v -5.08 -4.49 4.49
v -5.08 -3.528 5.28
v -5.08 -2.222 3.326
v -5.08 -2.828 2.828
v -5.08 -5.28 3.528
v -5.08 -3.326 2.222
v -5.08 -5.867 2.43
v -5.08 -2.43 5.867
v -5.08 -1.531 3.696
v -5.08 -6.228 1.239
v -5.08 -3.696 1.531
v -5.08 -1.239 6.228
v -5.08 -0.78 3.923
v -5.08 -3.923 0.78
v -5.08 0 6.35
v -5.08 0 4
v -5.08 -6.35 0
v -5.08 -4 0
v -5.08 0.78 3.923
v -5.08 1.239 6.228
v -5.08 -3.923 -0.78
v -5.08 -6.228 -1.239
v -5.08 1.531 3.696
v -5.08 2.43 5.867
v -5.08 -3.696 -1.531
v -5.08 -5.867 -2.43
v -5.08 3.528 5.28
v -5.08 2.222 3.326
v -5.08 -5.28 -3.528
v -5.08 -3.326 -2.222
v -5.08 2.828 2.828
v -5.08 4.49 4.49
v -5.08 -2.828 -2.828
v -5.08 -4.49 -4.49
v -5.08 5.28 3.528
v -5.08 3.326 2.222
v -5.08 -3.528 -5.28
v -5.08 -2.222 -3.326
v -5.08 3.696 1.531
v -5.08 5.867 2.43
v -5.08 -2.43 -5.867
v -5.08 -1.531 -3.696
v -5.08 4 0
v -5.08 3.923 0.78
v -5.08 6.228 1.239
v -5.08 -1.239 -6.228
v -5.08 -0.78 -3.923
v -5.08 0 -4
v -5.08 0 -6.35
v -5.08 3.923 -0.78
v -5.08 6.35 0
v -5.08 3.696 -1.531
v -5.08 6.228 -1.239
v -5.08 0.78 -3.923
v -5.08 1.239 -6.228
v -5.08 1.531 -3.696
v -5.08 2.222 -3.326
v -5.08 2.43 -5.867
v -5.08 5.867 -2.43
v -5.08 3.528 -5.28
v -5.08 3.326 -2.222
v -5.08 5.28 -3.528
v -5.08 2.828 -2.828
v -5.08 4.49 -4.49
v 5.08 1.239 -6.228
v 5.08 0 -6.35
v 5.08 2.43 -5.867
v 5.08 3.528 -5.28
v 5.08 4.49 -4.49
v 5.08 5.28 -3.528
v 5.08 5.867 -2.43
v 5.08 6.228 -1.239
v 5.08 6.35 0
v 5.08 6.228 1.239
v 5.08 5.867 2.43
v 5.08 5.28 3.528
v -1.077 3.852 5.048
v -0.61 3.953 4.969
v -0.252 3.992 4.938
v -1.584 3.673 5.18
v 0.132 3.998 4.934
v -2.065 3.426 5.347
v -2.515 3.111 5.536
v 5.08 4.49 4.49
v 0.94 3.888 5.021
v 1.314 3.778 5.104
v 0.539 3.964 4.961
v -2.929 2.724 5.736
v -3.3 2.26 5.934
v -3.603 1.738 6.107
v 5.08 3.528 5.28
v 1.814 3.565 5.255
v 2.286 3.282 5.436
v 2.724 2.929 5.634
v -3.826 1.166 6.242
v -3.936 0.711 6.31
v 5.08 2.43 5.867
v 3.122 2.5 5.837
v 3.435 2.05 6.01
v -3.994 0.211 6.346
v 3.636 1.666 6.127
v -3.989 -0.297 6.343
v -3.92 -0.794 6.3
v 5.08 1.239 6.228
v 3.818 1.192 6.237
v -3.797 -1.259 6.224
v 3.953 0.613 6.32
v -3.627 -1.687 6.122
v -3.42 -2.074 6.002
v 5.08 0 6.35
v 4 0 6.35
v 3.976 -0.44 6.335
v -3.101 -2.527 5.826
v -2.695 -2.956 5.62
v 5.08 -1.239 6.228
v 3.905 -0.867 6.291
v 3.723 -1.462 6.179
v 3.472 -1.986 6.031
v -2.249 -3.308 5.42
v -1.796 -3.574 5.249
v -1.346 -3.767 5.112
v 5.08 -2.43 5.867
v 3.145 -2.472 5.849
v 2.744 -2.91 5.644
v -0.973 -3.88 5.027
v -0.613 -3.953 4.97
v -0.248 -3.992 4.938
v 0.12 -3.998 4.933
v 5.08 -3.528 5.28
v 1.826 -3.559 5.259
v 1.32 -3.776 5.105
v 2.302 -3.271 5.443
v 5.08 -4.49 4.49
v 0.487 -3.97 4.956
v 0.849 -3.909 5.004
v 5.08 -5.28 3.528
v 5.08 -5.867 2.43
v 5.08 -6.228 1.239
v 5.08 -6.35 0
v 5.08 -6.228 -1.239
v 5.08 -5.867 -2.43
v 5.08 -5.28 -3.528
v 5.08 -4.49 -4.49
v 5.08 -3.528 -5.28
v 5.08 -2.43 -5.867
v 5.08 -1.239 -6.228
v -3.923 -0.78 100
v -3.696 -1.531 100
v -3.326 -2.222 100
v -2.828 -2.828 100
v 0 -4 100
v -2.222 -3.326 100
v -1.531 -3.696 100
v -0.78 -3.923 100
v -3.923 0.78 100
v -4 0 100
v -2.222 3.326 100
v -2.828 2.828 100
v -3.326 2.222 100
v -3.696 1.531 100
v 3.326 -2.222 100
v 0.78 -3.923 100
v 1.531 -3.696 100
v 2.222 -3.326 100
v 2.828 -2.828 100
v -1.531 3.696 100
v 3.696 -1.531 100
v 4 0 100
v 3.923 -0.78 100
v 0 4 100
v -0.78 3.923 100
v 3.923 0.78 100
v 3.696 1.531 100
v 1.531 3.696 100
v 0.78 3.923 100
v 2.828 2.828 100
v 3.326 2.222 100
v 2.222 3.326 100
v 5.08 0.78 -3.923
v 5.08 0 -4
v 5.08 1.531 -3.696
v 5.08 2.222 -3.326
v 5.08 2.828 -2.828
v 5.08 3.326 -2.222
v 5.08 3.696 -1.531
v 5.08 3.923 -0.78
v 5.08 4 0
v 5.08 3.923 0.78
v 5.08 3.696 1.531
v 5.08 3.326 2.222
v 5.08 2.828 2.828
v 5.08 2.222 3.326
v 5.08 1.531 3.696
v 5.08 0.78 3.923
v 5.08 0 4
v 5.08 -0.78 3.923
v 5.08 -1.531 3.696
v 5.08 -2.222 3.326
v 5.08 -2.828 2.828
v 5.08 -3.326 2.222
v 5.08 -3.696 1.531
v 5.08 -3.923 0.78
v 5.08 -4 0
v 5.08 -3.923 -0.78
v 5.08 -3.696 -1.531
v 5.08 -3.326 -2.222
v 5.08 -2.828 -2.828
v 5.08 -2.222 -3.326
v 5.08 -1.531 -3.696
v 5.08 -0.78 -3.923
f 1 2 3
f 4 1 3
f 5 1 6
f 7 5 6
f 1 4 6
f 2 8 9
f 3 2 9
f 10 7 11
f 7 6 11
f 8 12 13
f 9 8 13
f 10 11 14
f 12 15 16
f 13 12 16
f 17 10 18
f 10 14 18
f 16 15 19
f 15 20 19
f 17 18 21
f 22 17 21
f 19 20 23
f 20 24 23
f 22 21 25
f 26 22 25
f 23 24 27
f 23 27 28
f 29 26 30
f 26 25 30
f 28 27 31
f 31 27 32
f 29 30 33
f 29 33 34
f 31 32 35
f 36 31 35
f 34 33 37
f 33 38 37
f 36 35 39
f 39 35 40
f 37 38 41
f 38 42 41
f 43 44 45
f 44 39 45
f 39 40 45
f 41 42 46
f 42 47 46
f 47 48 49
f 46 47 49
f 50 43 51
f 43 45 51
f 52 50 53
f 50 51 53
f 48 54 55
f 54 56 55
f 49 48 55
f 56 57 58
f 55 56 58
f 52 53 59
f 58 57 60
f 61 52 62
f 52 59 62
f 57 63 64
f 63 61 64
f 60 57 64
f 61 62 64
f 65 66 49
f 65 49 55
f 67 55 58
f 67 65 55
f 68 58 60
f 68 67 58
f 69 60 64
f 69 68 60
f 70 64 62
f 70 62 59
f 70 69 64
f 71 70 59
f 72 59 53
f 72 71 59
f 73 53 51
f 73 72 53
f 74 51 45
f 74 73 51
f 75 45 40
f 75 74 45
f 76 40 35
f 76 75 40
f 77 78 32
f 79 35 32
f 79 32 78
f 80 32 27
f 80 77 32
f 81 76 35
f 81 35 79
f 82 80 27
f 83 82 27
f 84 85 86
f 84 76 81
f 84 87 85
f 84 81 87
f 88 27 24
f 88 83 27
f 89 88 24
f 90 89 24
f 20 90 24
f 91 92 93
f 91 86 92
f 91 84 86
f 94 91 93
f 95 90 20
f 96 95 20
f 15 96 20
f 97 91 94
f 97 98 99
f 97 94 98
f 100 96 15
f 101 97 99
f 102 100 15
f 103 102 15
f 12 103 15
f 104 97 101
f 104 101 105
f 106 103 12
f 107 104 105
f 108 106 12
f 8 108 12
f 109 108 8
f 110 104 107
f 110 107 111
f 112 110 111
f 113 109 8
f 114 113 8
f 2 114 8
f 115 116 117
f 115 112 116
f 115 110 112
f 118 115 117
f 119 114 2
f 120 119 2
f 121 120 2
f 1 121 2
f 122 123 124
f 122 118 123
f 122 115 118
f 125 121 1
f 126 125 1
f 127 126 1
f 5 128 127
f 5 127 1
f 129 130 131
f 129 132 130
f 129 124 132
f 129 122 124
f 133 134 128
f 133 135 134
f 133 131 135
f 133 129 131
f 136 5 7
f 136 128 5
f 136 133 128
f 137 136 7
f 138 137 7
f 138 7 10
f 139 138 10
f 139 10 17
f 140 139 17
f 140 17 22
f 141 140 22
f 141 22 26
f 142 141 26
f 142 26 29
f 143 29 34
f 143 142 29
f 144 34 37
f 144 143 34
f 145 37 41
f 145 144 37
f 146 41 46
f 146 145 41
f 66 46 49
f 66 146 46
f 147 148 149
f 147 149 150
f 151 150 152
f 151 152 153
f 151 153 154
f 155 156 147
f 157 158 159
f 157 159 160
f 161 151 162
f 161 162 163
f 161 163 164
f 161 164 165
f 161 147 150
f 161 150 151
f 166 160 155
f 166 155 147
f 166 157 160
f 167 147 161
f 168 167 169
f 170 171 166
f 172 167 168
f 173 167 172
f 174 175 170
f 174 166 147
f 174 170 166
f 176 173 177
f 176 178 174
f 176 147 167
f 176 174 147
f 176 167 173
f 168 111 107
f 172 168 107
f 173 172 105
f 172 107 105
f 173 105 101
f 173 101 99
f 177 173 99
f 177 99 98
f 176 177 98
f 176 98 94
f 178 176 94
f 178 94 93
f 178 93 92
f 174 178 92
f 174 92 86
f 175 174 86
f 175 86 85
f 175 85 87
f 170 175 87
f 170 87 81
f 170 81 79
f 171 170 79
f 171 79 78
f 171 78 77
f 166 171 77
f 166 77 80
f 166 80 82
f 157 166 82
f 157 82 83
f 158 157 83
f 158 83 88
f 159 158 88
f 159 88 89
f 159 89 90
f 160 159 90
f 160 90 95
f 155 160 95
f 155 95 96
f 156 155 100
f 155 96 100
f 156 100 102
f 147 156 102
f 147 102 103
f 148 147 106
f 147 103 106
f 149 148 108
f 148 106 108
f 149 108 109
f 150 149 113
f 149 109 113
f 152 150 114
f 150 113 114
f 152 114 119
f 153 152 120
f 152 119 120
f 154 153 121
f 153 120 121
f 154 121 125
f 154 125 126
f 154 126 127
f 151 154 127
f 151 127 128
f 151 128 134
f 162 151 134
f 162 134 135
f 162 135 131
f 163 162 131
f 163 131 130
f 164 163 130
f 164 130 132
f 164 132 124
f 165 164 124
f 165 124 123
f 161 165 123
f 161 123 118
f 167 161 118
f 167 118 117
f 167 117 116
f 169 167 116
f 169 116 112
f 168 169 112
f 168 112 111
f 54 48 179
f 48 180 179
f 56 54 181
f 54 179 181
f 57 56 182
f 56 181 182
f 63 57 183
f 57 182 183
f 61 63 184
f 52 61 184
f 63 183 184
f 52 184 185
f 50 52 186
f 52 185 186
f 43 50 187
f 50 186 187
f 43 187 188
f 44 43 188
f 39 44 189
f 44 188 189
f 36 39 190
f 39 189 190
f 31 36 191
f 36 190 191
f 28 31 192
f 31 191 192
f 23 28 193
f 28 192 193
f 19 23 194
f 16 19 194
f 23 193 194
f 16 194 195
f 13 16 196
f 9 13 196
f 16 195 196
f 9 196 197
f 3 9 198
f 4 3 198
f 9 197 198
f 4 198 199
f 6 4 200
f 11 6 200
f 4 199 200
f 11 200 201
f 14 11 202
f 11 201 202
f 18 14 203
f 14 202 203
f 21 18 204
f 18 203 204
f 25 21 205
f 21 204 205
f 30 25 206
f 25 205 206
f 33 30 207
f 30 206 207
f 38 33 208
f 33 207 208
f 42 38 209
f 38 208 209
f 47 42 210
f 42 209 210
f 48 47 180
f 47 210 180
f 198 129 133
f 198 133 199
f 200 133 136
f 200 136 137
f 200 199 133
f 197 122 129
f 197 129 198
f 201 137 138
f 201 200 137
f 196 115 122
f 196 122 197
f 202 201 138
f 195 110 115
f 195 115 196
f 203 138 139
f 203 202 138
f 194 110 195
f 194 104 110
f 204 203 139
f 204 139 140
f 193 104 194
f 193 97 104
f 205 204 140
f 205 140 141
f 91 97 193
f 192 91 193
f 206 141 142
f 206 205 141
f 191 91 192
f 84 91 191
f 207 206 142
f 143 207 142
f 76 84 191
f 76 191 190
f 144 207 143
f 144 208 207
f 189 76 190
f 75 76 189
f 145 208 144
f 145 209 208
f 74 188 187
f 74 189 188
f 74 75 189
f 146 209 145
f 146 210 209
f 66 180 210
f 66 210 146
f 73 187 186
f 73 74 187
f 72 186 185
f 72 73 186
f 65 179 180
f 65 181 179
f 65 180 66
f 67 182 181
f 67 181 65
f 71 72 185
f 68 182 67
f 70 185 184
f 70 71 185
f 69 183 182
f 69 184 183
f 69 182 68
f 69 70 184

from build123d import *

# Parameters (mm, degrees)
SKETCH2_R           = 4
BOSS_EXTRUDE1_DEPTH = 100
SKETCH1_R           = 6.35
BOSS_EXTRUDE2_DEPTH = 5.08
SKETCH1_3_R         = 4
CUT_EXTRUDE1_DEPTH  = 5.08


with BuildPart() as part:
    # Sketch2 → Boss-Extrude1 (new body)
    with BuildSketch(Plane(origin=(0, 0, 0), x_dir=(0, 1, 0), z_dir=(0, 0, 1))):
        Circle(SKETCH2_R)
    extrude(amount=BOSS_EXTRUDE1_DEPTH)

    # Sketch1 → Boss-Extrude2 (add, symmetric)
    with BuildSketch(Plane.YZ):
        Circle(SKETCH1_R)
    extrude(amount=BOSS_EXTRUDE2_DEPTH, both=True)

    # Sketch1<3> → Cut-Extrude1 (cut, symmetric)
    with BuildSketch(Plane.YZ):
        Circle(SKETCH1_3_R)
    extrude(amount=CUT_EXTRUDE1_DEPTH, both=True, mode=Mode.SUBTRACT)


solid = part.part
